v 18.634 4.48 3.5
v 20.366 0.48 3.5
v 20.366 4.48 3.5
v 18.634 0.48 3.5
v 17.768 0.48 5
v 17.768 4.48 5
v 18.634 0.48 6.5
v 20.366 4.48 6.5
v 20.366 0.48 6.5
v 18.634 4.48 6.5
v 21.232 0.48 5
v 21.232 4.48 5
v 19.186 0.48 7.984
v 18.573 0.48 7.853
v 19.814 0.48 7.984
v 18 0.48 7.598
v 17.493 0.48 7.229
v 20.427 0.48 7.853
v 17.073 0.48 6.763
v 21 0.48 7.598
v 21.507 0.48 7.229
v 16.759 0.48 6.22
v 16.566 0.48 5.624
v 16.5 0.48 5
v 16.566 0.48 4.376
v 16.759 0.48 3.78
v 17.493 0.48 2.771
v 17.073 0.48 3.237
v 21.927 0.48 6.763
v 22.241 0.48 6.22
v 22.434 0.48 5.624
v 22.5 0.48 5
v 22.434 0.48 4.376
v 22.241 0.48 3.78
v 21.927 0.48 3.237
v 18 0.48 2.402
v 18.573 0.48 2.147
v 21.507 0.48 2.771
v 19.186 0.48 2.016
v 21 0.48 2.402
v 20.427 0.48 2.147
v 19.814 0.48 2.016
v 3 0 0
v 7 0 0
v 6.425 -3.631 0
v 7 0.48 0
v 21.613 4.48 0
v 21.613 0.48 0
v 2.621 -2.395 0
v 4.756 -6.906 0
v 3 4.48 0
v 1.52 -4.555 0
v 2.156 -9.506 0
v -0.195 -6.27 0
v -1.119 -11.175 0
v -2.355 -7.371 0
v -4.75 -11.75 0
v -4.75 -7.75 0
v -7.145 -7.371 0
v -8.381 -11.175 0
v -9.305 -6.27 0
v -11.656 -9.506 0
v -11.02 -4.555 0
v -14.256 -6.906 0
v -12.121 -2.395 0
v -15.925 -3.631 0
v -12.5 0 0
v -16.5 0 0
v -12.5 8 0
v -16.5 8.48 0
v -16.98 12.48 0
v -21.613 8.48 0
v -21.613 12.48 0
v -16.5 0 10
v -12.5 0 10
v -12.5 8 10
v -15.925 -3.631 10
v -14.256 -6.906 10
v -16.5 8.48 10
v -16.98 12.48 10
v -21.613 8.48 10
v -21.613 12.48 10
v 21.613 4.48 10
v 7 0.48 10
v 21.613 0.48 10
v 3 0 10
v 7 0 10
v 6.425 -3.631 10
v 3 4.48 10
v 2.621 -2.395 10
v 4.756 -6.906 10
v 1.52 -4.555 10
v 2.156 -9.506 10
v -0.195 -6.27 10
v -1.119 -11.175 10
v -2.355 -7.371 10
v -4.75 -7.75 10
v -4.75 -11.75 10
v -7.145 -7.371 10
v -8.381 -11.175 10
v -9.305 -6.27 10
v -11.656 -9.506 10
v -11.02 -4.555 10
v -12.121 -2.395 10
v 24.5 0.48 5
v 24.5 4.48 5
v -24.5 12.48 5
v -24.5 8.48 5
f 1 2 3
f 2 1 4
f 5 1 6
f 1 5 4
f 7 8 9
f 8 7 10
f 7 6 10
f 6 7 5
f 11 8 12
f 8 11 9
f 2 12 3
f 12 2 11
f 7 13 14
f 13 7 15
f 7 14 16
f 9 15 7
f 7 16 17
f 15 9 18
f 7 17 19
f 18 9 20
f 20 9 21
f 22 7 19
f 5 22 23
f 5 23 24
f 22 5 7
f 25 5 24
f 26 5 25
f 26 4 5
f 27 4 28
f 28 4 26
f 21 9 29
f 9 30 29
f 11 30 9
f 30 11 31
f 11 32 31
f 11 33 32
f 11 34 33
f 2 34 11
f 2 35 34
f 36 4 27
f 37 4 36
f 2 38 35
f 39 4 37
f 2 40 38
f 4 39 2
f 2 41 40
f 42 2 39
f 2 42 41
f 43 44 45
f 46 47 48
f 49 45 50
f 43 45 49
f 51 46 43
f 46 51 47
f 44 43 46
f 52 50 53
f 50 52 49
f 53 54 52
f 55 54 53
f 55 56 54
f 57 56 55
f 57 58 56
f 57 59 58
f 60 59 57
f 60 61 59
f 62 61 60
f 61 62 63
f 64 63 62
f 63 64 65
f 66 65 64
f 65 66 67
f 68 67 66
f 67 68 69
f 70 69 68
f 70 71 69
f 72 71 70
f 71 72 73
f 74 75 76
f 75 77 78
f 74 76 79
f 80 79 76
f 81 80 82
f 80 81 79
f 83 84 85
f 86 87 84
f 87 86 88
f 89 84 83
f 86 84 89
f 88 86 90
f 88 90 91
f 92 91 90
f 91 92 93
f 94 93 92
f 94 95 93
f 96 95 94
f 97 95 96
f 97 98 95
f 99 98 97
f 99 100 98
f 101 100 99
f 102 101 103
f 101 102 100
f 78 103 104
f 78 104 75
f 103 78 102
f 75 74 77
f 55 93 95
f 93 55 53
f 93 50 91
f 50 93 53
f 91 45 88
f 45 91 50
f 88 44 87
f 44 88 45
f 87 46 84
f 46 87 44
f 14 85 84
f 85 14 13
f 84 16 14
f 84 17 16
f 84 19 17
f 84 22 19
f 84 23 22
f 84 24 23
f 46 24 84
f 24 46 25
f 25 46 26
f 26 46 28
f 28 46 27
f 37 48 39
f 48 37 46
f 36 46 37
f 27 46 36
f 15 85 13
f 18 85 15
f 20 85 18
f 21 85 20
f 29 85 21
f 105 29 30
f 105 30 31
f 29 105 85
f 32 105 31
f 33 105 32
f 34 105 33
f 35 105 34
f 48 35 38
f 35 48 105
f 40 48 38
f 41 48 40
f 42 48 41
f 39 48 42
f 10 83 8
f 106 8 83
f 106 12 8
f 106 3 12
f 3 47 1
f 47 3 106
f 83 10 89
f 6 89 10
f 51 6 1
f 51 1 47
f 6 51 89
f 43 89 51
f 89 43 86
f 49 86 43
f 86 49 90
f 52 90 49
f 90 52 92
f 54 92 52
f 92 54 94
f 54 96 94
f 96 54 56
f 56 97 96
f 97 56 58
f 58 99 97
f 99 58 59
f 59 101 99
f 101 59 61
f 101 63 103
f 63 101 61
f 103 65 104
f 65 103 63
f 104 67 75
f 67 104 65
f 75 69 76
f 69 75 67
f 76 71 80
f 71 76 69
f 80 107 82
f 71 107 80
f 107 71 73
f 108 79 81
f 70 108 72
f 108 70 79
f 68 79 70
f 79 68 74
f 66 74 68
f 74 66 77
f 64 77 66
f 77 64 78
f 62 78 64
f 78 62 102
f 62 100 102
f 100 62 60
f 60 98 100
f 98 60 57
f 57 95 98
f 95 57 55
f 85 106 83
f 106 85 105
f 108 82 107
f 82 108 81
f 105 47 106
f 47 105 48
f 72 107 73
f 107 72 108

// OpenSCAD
include <wallace2.scad>;
y_bearing_retainer();

module y_bearing_retainer() intersection() {
	difference() {
		linear_extrude(height = 10, convexity = 5) difference() {
			union() {
				intersection() {
					translate([-yz_motor_distance / 2 + bearing_size / 2, 0, 0]) circle(bearing_size / 2 + 4);
					translate([-yz_motor_distance / 2 + bearing_size / 2 - bearing_size / 2 - 4, -bearing_size, 0]) square([bearing_size + 8, bearing_size]);
				}
				translate([-yz_motor_distance / 2 + bearing_size / 2 - bearing_size / 2 - 4, 0, 0]) #square([bearing_size + 8, bearing_size * sqrt(2) / 4 - 1]);
				translate([10, bearing_size * sqrt(2) / 4 - 3, 0]) square([yz_motor_distance + motor_casing - motor_screw_spacing + 10, 4], center = true);
				// hook
				translate([-25, bearing_size * sqrt(2) / 4 - 3+8, 0]) square([yz_motor_distance + motor_casing - motor_screw_spacing + 10, 4], center = true);
				// hook to retainer
				translate([-11.5, bearing_size * sqrt(2) / 4 - 3+4, 0]) #square([10, 4], center = true);
			}
			translate([-yz_motor_distance / 2 + bearing_size / 2, 0, 0]) circle(bearing_size / 2);
			translate([-yz_motor_distance / 2 + bearing_size / 2 - bearing_size / 2, 0, 0]) square(bearing_size);
			translate([-yz_motor_distance / 2 + bearing_size / 2 - bearing_size / 2+4, 4, 0]) rotate([0,0,45]) #square(bearing_size);
		}
		//screw holes
		for(side = [1]) translate([side * (yz_motor_distance + motor_casing - motor_screw_spacing) / 2, 0, 5]) rotate(90) rotate([90, 0, 90]) {
			cylinder(r = m3_size * da6, h = bearing_size, center = true, $fn = 6);
			translate([0, 0, bearing_size * sqrt(2) / 4 - 5]) rotate([180, 0, 0]) cylinder(r = m3_size, h = bearing_size, $fn = 30);
		}
	}
	#translate([0, 0, 5]) rotate(90) rotate([90, 0, 90]) cylinder(r = (yz_motor_distance + motor_casing - motor_screw_spacing + 10) / 2, h = bearing_size + 10, center = true, $fn = 6);
}
